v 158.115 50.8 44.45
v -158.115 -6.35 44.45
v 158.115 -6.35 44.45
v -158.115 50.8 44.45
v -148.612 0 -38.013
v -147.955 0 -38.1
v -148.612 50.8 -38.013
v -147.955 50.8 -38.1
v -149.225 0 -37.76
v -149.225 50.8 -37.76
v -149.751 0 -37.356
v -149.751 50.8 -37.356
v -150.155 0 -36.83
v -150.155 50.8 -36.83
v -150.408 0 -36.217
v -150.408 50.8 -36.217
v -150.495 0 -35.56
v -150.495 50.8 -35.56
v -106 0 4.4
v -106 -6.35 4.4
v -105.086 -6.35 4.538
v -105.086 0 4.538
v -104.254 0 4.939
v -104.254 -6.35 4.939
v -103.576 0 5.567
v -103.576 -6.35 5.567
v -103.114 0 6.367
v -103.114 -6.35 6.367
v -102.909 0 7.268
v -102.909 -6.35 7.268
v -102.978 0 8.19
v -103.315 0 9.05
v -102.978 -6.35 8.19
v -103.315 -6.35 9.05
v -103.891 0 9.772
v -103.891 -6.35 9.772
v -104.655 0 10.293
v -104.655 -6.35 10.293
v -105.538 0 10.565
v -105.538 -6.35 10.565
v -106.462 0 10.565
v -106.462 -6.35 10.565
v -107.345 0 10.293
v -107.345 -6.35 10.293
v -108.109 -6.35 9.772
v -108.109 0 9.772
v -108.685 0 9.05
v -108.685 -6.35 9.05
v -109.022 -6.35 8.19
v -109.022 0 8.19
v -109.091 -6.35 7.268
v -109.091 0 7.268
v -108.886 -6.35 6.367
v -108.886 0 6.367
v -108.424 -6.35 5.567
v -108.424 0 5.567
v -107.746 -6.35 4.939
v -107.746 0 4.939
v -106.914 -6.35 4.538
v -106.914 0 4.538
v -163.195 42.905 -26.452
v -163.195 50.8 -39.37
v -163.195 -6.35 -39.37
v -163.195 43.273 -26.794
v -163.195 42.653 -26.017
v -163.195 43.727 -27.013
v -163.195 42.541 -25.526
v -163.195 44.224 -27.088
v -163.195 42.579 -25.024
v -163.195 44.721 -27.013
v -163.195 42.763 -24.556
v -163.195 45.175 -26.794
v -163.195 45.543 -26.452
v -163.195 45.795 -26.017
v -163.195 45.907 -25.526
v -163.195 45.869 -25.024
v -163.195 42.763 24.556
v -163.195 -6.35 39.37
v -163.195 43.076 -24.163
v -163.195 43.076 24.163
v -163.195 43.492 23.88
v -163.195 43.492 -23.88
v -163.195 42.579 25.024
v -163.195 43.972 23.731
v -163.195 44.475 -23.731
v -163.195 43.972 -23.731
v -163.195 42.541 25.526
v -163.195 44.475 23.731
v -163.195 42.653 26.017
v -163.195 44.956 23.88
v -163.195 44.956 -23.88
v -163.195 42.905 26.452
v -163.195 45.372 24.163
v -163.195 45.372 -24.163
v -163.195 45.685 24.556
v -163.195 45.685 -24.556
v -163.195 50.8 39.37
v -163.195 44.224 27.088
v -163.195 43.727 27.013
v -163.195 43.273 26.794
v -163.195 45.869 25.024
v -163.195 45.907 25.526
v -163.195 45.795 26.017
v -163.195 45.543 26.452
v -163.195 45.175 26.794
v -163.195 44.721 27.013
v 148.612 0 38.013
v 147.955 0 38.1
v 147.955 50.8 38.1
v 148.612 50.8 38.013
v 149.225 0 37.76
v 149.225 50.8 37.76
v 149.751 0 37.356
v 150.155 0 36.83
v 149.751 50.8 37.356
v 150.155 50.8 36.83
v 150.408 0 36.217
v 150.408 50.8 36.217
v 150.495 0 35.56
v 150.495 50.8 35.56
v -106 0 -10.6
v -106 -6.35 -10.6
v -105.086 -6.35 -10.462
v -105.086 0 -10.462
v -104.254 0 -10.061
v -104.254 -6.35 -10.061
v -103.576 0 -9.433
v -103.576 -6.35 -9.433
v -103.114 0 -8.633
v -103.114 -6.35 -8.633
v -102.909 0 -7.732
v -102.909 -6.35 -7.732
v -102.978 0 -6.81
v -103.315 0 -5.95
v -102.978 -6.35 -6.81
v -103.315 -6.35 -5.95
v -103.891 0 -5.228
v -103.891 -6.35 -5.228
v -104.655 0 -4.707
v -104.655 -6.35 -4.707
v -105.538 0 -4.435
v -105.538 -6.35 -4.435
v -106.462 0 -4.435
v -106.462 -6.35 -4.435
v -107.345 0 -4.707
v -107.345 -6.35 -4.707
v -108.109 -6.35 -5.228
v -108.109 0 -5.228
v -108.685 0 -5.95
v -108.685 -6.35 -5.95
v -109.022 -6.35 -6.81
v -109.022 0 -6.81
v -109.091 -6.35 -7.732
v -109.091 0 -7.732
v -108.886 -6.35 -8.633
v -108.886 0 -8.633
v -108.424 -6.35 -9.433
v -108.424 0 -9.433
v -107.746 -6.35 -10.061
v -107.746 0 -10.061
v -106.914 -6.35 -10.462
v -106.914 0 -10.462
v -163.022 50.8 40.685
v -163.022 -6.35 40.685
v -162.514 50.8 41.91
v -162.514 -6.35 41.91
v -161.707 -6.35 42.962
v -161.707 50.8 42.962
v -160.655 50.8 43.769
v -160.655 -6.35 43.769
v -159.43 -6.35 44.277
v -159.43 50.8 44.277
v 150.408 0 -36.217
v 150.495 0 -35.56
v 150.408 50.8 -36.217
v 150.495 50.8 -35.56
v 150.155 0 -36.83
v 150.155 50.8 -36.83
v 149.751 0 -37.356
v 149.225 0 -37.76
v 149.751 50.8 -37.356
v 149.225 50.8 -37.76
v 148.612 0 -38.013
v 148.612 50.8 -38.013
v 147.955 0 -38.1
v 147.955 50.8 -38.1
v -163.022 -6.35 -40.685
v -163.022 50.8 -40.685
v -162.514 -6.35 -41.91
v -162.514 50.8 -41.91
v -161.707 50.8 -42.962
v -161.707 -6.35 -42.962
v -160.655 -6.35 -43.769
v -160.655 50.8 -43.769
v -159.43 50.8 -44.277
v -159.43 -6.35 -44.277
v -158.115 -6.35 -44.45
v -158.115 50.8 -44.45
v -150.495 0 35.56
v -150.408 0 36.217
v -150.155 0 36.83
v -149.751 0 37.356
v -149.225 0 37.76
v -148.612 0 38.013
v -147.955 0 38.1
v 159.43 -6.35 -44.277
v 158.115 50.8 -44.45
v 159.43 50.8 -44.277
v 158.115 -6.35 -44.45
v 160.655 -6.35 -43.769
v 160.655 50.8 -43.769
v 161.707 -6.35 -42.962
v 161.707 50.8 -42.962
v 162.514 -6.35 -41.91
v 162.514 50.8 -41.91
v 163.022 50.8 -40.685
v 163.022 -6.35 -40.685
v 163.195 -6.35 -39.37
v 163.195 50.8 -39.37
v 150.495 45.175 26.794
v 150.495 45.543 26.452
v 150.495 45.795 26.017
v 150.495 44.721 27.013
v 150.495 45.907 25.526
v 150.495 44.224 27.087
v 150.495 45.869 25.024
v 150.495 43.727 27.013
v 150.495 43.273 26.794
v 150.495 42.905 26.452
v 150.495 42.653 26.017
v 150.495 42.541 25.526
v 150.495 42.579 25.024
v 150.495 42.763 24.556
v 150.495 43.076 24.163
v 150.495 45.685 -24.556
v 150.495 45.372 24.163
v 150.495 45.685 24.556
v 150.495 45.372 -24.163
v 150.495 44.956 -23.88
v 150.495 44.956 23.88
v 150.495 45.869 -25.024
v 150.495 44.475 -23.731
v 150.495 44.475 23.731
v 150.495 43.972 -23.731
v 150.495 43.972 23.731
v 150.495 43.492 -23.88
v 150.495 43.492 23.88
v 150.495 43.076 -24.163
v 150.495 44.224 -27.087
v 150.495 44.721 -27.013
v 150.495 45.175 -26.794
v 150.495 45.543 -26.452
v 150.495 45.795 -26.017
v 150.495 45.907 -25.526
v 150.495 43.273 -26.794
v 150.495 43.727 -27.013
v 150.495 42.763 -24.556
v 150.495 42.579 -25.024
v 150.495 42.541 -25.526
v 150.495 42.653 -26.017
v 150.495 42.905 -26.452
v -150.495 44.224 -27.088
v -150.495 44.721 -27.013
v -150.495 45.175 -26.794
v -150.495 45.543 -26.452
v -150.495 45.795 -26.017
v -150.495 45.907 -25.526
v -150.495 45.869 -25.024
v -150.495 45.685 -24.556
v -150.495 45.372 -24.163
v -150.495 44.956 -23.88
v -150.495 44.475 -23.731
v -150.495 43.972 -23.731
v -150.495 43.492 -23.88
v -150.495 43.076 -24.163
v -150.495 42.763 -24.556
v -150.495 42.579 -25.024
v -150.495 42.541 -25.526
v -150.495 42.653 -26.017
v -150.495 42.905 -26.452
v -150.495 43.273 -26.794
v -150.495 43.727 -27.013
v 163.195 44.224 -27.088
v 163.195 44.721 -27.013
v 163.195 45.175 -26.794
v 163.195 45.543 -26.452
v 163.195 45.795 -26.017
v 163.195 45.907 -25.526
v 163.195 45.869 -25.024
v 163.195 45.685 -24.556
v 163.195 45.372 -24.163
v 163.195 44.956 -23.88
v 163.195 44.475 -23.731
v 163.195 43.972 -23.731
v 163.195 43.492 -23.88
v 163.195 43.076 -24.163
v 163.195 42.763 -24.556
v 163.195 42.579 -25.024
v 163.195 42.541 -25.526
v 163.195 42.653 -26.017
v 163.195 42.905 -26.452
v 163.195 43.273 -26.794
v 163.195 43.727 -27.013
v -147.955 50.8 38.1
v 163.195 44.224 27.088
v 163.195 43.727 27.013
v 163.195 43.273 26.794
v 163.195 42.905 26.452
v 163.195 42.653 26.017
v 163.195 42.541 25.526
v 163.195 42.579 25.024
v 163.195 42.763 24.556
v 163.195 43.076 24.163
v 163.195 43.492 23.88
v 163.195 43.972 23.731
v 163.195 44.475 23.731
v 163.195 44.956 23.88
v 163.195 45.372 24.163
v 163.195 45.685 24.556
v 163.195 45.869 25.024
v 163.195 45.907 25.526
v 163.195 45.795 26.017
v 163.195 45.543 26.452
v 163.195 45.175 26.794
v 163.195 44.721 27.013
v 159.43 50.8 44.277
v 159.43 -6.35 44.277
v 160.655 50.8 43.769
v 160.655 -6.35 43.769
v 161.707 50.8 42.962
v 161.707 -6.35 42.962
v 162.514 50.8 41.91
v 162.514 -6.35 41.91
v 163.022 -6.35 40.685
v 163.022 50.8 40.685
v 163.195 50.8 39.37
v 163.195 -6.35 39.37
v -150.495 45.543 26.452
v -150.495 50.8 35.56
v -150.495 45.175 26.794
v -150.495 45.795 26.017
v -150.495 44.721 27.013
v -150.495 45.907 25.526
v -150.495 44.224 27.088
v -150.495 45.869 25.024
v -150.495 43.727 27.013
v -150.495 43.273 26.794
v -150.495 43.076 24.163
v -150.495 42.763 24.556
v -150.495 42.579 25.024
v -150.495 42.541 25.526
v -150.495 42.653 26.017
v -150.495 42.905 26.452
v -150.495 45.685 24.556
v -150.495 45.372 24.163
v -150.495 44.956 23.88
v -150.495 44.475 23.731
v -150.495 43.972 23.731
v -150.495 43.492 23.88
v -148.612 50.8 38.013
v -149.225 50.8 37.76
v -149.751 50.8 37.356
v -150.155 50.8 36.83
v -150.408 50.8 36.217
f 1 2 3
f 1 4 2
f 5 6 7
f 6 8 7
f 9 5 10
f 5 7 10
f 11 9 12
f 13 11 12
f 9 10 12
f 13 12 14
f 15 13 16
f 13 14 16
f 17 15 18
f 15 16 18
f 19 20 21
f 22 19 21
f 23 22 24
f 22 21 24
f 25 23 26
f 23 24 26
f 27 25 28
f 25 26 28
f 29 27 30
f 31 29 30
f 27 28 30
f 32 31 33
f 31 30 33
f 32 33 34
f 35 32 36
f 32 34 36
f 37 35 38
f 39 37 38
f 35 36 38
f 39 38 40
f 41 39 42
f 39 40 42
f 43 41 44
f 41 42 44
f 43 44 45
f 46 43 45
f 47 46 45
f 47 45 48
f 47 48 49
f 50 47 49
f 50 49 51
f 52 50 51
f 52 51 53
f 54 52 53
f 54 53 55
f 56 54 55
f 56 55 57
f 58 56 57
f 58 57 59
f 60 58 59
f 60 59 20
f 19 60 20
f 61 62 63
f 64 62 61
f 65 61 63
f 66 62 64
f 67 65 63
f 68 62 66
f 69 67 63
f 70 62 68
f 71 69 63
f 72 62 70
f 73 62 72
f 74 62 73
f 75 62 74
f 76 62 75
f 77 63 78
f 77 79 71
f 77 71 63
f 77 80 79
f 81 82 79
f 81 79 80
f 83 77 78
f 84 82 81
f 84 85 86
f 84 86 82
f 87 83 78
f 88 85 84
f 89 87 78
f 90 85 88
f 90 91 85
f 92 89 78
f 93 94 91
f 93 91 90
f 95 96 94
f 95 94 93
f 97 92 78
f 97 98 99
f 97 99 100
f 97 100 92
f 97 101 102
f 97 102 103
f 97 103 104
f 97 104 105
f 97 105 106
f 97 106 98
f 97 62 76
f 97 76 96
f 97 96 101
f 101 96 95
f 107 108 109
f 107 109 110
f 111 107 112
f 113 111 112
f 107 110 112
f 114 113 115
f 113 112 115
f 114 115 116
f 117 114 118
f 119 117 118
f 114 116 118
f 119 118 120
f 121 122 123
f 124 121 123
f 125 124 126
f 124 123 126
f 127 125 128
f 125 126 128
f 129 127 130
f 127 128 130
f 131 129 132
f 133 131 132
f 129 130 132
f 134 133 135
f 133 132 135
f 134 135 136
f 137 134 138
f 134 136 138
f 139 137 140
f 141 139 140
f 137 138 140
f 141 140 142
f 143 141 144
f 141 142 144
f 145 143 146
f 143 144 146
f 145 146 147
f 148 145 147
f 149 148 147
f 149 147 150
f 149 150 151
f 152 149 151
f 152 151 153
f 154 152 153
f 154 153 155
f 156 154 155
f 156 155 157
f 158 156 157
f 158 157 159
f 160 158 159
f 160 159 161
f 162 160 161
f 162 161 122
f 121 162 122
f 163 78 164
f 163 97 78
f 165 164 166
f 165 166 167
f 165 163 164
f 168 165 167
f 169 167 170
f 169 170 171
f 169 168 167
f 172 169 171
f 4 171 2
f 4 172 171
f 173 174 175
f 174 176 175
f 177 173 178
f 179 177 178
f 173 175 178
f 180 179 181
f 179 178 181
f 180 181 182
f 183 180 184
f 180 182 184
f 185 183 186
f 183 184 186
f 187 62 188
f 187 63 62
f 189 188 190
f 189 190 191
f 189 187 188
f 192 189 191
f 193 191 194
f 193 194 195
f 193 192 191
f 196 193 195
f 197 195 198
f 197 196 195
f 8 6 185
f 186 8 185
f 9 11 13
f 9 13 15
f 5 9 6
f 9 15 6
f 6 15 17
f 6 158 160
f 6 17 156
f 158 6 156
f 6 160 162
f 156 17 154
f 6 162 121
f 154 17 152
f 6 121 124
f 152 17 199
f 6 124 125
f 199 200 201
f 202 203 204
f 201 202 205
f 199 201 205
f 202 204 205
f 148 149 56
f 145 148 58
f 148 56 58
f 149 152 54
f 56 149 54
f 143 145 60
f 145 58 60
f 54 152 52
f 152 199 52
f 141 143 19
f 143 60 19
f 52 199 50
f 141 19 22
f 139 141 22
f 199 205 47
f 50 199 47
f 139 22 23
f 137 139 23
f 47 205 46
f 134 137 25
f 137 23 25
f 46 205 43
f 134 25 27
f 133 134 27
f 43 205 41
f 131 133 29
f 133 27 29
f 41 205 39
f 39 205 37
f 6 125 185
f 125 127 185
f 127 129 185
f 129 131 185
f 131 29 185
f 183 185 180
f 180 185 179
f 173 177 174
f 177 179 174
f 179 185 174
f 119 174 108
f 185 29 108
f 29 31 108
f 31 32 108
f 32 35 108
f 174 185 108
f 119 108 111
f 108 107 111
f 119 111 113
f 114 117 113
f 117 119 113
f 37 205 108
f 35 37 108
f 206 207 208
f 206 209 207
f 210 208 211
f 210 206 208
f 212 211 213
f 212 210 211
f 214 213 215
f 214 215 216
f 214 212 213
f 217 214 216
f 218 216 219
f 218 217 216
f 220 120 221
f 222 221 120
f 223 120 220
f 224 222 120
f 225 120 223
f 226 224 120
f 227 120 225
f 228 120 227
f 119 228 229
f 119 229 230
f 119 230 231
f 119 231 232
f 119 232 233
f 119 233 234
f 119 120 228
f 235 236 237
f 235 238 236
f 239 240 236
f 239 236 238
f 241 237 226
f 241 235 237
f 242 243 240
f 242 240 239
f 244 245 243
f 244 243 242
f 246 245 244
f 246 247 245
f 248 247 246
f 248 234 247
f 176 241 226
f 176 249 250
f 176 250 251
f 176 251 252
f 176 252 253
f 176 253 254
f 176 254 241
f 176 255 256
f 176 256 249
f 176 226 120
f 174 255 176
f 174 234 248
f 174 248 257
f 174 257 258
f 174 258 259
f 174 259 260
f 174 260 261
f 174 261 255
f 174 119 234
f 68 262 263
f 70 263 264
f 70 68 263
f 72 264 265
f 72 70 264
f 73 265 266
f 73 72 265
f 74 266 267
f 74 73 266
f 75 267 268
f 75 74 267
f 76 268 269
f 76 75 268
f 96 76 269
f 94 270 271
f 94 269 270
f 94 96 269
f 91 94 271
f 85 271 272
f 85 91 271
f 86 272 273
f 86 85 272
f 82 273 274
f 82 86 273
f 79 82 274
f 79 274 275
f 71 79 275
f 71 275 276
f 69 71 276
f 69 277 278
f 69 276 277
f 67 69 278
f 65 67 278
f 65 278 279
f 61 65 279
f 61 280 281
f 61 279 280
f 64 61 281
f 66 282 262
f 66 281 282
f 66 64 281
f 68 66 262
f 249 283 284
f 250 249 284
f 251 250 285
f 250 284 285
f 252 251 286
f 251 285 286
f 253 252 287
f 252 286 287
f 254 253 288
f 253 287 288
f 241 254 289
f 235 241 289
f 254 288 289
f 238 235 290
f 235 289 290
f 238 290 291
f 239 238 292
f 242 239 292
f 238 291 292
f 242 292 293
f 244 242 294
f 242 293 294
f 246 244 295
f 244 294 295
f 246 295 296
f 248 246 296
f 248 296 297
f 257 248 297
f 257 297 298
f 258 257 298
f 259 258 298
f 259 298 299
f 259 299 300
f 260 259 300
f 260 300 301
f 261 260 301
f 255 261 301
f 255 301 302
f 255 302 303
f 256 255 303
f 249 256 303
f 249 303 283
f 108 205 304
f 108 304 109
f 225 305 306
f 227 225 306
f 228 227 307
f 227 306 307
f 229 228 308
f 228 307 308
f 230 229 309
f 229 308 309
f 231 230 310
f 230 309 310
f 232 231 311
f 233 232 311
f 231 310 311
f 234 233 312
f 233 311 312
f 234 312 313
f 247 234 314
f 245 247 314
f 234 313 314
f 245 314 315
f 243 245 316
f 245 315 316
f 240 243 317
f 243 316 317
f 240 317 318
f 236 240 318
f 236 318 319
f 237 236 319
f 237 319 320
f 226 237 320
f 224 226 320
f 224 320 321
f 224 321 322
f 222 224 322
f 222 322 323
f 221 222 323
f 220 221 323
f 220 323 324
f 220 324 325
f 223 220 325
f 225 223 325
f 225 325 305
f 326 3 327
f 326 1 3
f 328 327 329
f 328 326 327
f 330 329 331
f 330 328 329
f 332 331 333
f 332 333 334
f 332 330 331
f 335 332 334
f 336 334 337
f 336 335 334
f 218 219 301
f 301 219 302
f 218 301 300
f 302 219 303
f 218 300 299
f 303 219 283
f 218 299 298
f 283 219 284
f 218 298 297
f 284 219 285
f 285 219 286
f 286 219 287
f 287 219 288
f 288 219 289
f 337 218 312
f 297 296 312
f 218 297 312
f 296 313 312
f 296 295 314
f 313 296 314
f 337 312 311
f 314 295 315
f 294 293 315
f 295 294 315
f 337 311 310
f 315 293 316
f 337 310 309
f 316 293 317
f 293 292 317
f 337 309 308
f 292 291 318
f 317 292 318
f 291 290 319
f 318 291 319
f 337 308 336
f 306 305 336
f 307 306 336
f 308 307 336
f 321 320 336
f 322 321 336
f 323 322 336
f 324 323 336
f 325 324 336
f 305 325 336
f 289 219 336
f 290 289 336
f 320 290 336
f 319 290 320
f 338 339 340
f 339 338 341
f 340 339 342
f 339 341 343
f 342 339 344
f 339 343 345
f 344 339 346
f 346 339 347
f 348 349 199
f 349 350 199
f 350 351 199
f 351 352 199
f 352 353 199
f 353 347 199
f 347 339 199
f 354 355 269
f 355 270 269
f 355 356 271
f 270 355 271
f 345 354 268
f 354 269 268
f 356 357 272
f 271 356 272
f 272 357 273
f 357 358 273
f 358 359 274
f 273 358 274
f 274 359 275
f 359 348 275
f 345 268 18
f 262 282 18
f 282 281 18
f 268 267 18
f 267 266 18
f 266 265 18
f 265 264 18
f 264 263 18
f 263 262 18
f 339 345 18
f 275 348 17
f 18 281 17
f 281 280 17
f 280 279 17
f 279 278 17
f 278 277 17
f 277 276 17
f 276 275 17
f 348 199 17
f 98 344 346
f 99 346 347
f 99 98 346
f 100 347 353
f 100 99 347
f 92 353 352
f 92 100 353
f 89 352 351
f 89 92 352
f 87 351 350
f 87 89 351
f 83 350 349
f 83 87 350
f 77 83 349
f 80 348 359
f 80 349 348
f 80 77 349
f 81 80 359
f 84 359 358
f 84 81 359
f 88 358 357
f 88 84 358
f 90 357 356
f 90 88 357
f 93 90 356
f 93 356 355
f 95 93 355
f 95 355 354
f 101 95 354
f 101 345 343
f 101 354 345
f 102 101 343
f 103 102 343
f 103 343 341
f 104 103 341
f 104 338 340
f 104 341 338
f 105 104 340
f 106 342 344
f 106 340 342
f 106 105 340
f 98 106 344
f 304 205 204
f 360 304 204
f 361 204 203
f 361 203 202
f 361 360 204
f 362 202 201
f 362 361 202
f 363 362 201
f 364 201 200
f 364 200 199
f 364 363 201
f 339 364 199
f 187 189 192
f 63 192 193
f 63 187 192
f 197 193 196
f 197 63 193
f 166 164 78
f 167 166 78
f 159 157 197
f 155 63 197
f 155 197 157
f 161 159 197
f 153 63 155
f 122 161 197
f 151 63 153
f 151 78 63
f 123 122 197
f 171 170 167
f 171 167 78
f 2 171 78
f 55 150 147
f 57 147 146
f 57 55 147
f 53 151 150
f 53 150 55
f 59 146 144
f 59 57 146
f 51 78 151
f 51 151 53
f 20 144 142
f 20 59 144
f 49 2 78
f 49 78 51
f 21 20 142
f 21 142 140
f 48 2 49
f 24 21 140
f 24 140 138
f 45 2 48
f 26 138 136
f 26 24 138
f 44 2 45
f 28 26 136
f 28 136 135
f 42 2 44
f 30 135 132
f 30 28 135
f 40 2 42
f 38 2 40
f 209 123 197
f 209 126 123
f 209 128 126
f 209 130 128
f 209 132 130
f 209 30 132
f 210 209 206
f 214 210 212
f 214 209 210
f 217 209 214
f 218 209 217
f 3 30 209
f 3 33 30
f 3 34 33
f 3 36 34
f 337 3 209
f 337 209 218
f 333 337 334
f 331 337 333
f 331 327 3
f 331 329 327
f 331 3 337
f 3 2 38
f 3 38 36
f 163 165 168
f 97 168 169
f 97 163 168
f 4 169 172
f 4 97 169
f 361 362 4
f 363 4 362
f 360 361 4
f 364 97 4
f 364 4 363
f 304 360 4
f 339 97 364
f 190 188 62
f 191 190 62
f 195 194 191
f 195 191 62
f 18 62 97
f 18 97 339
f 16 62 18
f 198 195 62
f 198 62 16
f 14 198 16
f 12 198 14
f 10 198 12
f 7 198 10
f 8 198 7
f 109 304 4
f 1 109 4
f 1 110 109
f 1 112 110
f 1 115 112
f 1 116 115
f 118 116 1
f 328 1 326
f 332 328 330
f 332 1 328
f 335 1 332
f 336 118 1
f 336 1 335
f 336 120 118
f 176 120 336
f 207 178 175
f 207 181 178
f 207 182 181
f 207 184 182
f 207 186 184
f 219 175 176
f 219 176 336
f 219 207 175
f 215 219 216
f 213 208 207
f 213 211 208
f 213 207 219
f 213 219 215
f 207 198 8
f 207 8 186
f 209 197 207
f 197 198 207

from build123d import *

# Parameters (mm, degrees)
SKETCH1_W           = 326.39
SKETCH1_H           = 88.9
SKETCH1_W_2         = 300.99
SKETCH1_H_2         = 76.2
BOSS_EXTRUDE1_DEPTH = 50.8
SKETCH2_W           = 326.39
SKETCH2_H           = 88.9
BOSS_EXTRUDE2_DEPTH = 6.35
SKETCH3_R           = 3.1
CUT_EXTRUDE1_DEPTH  = 179.534402917
SKETCH4_R           = 1.6875
CUT_EXTRUDE3_DEPTH  = 313.69
FILLET1_R           = 5.08
FILLET2_R           = 2.54


with BuildPart() as part:
    # Sketch1 → Boss-Extrude1 (new body)
    with BuildSketch(Plane(origin=(0, 0, 0), x_dir=(1, 0, 0), z_dir=(0, 1, 0))):
        Rectangle(SKETCH1_W, SKETCH1_H)
        Rectangle(SKETCH1_W_2, SKETCH1_H_2, mode=Mode.SUBTRACT)
    extrude(amount=BOSS_EXTRUDE1_DEPTH)

    # Sketch2 → Boss-Extrude2 (add)
    with BuildSketch(Plane.XZ):
        Rectangle(SKETCH2_W, SKETCH2_H)
    extrude(amount=BOSS_EXTRUDE2_DEPTH)

    # Sketch3 → Cut-Extrude1 (cut, through all)
    with BuildSketch(Plane.XZ.offset(6.35)):
        with Locations(Location((-106, 7.5, 0), (0, 0, 270))):
            Circle(SKETCH3_R)
        with Locations(Location((-106, -7.5, 0), (0, 0, 270))):
            Circle(SKETCH3_R)
    extrude(amount=-CUT_EXTRUDE1_DEPTH, mode=Mode.SUBTRACT)

    # Sketch4 → Cut-Extrude3 (cut)
    with BuildSketch(Plane(origin=(163.195, 0, 0), x_dir=(0, 0, -1), z_dir=(1, 0, 0))):
        with Locations((25.4, 44.22394)):
            Circle(SKETCH4_R)
        with Locations(Location((-25.4, 44.22394, 0), (0, 0, 180))):
            Circle(SKETCH4_R)
    cut_extrude3 = extrude(amount=-CUT_EXTRUDE3_DEPTH, mode=Mode.SUBTRACT)

    # Mirror2: Cut-Extrude3 across plane
    add(cut_extrude3.mirror(Plane(origin=(0, 0, 0), x_dir=(0, 0, 1), z_dir=(1, 0, 0))), mode=Mode.SUBTRACT)

    # Fillet1
    fillet1_edges = [part.edges().sort_by_distance(p)[0] for p in [
        (163.195, 22.225, 44.45),
        (-163.195, 22.225, 44.45),
        (-163.195, 22.225, -44.45),
        (163.195, 22.225, -44.45),
    ]]
    fillet(fillet1_edges, radius=FILLET1_R)

    # Fillet2
    fillet2_edges = [part.edges().sort_by_distance(p)[0] for p in [
        (150.495, 25.4, 38.1),
        (150.495, 25.4, -38.1),
        (-150.495, 25.4, -38.1),
        (-150.495, 25.4, 38.1),
    ]]
    fillet(fillet2_edges, radius=FILLET2_R)


solid = part.part
